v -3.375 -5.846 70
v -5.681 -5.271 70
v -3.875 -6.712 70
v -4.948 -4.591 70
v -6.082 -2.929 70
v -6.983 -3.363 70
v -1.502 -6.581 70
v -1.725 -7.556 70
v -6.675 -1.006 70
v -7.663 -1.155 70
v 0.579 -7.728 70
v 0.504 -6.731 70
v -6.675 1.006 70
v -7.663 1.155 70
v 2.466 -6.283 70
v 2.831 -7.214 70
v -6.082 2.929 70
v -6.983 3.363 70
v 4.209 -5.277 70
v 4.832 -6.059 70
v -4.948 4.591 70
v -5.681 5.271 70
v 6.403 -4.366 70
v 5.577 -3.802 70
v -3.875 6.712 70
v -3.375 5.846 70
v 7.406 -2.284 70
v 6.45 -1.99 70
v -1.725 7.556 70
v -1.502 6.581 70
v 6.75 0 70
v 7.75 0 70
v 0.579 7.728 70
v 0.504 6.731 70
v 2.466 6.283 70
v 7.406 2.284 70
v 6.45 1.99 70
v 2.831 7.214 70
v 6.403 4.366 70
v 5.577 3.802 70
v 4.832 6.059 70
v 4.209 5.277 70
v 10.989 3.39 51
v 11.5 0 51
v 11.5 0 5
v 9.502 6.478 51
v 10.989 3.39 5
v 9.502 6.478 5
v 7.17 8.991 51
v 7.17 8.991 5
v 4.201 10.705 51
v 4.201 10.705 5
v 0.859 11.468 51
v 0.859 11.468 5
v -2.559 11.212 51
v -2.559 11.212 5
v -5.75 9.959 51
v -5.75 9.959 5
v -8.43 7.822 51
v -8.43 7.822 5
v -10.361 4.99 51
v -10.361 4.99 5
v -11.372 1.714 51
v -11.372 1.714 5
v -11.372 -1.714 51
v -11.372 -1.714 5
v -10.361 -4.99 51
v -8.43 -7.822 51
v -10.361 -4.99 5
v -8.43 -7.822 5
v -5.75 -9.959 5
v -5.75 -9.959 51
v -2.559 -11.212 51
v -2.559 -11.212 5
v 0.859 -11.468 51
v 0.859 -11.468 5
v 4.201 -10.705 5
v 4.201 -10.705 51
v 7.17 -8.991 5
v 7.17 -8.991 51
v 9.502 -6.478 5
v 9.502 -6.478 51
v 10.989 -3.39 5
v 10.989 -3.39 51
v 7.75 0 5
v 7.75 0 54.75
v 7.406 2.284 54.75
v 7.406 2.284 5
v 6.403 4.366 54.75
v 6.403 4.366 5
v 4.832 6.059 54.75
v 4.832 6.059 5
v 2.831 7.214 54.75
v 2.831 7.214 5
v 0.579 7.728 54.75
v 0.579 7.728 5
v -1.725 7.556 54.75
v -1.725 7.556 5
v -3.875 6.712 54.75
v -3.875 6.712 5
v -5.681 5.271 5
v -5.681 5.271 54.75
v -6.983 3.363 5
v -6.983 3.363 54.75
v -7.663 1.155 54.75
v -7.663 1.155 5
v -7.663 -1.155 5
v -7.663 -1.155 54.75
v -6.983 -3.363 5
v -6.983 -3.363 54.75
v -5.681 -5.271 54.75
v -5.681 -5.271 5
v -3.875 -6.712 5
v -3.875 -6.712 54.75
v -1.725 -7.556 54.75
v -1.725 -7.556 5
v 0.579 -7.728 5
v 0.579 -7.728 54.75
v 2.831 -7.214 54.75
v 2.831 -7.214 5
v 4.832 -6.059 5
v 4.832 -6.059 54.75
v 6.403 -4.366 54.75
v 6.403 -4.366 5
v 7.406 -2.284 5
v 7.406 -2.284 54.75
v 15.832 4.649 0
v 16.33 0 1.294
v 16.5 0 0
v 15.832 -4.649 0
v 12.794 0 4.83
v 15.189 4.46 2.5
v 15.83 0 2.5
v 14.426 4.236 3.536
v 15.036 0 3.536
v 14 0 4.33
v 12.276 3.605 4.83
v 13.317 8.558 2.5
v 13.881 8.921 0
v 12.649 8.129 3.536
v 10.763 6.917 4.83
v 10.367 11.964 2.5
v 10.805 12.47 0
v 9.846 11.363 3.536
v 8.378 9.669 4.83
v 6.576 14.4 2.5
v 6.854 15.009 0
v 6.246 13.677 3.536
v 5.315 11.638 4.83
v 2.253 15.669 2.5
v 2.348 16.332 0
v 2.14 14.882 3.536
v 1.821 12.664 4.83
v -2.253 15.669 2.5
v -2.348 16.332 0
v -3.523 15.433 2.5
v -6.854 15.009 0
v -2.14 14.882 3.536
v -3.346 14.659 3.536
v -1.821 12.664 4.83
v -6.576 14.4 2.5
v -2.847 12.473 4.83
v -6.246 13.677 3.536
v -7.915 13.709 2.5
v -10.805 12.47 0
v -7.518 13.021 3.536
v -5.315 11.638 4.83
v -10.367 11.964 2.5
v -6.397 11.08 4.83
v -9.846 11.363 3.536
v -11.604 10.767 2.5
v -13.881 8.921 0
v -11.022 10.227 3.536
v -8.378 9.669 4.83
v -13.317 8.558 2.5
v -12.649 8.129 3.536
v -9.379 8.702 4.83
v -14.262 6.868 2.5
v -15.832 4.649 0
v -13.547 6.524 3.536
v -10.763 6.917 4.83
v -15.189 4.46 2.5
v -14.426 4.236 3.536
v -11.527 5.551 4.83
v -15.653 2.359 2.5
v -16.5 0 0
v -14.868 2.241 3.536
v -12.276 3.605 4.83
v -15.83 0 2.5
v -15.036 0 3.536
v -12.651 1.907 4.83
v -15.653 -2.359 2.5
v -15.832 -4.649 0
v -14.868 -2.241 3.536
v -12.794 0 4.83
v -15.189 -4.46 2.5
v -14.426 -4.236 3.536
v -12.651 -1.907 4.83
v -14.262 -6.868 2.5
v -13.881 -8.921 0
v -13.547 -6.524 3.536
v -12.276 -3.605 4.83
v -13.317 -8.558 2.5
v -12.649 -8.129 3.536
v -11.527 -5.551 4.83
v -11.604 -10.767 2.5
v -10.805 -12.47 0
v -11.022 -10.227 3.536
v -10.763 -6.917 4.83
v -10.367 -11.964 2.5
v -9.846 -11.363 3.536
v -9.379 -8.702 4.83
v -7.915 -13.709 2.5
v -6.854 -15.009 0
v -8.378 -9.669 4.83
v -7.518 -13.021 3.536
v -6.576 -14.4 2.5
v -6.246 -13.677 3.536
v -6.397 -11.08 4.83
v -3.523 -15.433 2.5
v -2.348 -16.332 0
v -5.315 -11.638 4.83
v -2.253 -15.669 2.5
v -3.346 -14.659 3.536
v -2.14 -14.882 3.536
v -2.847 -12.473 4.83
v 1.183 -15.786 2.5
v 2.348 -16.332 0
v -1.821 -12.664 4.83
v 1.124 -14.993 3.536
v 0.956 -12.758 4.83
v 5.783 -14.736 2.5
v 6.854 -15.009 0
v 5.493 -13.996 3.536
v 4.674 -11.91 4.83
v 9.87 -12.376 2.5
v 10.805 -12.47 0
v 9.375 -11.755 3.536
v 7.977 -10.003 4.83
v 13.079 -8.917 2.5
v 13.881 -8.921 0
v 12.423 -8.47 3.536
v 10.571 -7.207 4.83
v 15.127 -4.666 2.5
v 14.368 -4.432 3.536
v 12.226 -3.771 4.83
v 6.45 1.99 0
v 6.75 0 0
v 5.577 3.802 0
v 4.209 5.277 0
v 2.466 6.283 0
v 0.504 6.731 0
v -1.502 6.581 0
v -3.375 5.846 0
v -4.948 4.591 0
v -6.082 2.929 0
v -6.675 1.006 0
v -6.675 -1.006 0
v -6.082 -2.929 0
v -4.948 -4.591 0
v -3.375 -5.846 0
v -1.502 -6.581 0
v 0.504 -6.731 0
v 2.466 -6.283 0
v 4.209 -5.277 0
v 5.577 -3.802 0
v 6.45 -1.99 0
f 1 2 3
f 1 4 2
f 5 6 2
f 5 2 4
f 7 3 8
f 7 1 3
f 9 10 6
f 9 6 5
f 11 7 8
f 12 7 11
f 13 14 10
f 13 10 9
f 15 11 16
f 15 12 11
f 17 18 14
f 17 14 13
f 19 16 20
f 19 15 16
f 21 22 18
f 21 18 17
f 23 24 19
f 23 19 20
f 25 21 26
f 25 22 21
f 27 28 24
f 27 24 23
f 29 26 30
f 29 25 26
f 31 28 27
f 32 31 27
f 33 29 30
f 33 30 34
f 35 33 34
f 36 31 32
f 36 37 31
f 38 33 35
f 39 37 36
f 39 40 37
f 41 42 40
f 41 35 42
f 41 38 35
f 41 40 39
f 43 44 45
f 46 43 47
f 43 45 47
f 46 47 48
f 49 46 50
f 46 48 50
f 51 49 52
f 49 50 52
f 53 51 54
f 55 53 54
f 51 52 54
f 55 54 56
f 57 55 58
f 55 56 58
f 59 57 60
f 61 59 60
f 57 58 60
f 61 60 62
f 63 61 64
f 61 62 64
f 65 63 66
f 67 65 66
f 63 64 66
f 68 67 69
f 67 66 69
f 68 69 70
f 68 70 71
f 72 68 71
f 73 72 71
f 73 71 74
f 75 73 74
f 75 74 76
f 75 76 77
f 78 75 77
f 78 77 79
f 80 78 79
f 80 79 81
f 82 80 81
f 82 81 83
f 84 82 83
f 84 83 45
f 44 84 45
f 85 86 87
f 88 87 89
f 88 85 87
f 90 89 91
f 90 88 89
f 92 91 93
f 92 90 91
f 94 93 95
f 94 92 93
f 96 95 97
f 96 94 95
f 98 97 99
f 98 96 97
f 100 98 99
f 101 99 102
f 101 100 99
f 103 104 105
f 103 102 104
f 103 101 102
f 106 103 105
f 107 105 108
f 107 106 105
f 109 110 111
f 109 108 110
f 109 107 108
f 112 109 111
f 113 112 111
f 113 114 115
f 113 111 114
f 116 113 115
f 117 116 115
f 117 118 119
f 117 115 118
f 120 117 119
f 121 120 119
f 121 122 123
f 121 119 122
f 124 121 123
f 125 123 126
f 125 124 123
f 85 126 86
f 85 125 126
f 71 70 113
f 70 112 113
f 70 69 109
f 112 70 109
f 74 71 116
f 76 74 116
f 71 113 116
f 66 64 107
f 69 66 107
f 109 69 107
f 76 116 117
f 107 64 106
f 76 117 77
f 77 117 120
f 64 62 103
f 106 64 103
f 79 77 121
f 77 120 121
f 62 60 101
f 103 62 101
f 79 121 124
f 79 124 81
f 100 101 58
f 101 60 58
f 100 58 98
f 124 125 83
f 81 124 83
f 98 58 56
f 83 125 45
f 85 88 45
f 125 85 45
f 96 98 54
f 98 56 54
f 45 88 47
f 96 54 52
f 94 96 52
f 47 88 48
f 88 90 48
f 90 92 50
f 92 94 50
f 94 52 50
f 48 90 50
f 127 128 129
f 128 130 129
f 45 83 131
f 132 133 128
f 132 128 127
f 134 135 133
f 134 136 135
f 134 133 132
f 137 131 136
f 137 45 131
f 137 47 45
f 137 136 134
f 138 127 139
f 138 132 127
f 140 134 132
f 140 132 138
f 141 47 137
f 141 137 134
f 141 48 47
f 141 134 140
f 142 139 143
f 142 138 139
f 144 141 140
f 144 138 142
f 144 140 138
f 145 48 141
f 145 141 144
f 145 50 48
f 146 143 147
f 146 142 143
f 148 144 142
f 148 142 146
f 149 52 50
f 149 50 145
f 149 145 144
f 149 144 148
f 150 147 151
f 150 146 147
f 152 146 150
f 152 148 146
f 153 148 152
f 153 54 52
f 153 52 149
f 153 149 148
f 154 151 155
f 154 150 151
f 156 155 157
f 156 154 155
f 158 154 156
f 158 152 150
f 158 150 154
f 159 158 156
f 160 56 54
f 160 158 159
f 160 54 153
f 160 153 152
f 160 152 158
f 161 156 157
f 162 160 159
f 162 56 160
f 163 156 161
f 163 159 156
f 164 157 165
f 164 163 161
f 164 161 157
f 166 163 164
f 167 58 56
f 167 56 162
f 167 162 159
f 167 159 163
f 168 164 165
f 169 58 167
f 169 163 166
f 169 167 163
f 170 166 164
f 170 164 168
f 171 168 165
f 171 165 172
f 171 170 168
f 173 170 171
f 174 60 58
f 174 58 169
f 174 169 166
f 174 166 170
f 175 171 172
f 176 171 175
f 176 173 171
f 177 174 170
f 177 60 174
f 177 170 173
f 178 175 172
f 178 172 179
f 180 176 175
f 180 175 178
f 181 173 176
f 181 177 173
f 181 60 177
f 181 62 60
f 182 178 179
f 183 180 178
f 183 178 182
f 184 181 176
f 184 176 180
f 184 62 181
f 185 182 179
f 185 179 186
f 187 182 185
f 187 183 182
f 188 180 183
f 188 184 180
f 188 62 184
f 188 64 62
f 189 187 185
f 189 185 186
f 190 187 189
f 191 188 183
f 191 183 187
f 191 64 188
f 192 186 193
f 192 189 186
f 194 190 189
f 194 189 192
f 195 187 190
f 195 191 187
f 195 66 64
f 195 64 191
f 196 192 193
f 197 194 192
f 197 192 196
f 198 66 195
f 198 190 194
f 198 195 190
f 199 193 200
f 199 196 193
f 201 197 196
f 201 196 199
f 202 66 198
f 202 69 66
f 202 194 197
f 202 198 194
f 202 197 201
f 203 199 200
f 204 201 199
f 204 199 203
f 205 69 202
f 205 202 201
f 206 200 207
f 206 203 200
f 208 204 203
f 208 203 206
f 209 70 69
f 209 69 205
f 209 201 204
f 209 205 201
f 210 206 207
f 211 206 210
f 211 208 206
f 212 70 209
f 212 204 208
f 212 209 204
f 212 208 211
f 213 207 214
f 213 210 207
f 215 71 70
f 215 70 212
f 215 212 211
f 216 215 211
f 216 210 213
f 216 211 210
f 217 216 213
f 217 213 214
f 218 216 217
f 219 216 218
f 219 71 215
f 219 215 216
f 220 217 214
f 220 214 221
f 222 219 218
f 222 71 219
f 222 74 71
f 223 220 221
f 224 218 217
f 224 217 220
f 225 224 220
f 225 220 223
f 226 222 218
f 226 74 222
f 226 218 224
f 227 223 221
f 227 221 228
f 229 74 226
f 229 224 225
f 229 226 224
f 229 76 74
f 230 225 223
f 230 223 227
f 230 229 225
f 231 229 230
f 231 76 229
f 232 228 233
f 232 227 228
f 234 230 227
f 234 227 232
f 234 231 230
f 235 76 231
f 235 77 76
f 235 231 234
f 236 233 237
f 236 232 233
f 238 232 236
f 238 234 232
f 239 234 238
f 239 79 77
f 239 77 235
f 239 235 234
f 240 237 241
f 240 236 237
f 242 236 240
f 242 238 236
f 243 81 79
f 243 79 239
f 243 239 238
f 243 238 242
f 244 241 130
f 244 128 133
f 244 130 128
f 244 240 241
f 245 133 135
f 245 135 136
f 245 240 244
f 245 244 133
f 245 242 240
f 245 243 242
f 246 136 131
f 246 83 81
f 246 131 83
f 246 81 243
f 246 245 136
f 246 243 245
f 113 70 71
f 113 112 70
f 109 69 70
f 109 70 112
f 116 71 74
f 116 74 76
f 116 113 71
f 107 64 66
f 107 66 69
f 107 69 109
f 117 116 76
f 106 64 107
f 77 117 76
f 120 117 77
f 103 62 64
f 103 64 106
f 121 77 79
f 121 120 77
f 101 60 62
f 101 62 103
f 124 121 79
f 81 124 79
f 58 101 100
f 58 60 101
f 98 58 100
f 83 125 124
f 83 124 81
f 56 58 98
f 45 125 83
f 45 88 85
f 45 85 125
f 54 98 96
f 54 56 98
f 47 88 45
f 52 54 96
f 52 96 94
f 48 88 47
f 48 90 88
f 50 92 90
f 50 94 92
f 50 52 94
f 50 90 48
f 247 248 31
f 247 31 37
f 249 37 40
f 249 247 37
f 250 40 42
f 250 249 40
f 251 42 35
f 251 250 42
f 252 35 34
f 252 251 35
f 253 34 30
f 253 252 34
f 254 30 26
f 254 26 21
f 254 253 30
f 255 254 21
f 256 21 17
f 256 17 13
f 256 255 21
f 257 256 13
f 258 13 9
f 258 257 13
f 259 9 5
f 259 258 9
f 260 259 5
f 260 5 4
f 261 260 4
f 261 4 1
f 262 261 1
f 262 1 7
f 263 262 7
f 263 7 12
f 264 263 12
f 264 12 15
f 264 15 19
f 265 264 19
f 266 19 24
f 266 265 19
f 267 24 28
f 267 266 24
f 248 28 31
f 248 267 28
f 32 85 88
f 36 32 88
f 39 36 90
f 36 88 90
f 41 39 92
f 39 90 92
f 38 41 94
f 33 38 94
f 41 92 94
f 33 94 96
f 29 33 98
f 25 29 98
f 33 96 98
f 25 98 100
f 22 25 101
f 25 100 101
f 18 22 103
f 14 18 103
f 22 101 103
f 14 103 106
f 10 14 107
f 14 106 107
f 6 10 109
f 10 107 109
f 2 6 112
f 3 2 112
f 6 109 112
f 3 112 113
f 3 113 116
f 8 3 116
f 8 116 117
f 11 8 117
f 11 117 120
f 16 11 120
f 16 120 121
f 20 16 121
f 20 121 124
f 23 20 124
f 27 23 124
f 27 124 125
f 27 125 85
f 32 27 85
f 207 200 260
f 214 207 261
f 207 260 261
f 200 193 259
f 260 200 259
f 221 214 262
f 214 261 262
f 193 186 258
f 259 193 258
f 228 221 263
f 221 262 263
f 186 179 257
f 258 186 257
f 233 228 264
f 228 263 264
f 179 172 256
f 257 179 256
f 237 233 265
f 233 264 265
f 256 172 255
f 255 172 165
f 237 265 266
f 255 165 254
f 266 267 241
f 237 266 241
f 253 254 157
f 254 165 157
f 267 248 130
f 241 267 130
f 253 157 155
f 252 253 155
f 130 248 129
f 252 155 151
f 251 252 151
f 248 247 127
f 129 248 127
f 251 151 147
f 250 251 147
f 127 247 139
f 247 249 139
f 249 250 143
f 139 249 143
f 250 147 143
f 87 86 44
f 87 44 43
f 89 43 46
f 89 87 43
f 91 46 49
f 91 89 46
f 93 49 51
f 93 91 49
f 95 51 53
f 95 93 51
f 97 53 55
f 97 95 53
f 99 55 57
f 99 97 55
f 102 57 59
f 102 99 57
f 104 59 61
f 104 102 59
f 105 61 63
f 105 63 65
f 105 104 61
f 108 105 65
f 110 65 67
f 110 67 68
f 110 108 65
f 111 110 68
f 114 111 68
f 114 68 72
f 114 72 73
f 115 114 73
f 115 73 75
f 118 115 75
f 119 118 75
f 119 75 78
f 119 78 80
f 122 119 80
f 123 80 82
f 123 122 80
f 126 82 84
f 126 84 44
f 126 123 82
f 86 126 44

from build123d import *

# Parameters (mm, degrees)
F0_R     = 16.5
F0_R_2   = 15.5
F0_R_3   = 7.75
F1_DEPTH = 5
F2_R     = 4.99999
F3_DEPTH = 51
F0_R_4   = 6.75
F5_DEPTH = 70


# Not quite as in the source:
# - a fillet or chamfer that OpenCascade refuses, or shapes differently, is made with other operations: its cross-section is extruded or revolved along the edge and cut away or added
# - a fillet or chamfer is up to 0.001 mm smaller than in the source, because OpenCascade refuses the exact size


with BuildPart() as f1:
    # F0 (on Top) → F1 (new body)
    with BuildSketch(Plane.XY):
        Circle(F0_R)
        Circle(F0_R_2, mode=Mode.SUBTRACT)
        Circle(F0_R_2)
        Circle(F0_R_3, mode=Mode.SUBTRACT)
    extrude(amount=F1_DEPTH)

    # F2 (radius 5 in the source; OpenCascade refuses exactly that, so slightly less here)
    f2_edges = [f1.edges().sort_by_distance(p)[0] for p in [
        (-16.5, 0, 5),
    ]]
    fillet(f2_edges, radius=F2_R)


with BuildPart() as f3:
    # F3 (new): a face of the model
    f3_faces = [f1.part.faces().sort_by_distance(p)[0] for p in [
        (-11.1747405978, 0, 5),
    ]]
    extrude(f3_faces, amount=F3_DEPTH)

    # F4: chamfer of 5 on 1 edges, made by hand

    # F4_s1 → F4_t2 (revolve, cut)
    with BuildSketch(Plane.XZ):
        Polygon((11.50001, 51), (6.50001, 56), (11.50001, 56), align=None)
    revolve(axis=Axis((0, 0, 56), (0, 0, 1)), mode=Mode.SUBTRACT)


with BuildPart() as f1_1:
    add(f1.part)

    # F0 (on Top) → F5 (join)
    with BuildSketch(Plane.XY):
        Circle(F0_R_3)
        Circle(F0_R_4, mode=Mode.SUBTRACT)
    extrude(amount=F5_DEPTH)


solid = Compound([f3.part, f1_1.part])
